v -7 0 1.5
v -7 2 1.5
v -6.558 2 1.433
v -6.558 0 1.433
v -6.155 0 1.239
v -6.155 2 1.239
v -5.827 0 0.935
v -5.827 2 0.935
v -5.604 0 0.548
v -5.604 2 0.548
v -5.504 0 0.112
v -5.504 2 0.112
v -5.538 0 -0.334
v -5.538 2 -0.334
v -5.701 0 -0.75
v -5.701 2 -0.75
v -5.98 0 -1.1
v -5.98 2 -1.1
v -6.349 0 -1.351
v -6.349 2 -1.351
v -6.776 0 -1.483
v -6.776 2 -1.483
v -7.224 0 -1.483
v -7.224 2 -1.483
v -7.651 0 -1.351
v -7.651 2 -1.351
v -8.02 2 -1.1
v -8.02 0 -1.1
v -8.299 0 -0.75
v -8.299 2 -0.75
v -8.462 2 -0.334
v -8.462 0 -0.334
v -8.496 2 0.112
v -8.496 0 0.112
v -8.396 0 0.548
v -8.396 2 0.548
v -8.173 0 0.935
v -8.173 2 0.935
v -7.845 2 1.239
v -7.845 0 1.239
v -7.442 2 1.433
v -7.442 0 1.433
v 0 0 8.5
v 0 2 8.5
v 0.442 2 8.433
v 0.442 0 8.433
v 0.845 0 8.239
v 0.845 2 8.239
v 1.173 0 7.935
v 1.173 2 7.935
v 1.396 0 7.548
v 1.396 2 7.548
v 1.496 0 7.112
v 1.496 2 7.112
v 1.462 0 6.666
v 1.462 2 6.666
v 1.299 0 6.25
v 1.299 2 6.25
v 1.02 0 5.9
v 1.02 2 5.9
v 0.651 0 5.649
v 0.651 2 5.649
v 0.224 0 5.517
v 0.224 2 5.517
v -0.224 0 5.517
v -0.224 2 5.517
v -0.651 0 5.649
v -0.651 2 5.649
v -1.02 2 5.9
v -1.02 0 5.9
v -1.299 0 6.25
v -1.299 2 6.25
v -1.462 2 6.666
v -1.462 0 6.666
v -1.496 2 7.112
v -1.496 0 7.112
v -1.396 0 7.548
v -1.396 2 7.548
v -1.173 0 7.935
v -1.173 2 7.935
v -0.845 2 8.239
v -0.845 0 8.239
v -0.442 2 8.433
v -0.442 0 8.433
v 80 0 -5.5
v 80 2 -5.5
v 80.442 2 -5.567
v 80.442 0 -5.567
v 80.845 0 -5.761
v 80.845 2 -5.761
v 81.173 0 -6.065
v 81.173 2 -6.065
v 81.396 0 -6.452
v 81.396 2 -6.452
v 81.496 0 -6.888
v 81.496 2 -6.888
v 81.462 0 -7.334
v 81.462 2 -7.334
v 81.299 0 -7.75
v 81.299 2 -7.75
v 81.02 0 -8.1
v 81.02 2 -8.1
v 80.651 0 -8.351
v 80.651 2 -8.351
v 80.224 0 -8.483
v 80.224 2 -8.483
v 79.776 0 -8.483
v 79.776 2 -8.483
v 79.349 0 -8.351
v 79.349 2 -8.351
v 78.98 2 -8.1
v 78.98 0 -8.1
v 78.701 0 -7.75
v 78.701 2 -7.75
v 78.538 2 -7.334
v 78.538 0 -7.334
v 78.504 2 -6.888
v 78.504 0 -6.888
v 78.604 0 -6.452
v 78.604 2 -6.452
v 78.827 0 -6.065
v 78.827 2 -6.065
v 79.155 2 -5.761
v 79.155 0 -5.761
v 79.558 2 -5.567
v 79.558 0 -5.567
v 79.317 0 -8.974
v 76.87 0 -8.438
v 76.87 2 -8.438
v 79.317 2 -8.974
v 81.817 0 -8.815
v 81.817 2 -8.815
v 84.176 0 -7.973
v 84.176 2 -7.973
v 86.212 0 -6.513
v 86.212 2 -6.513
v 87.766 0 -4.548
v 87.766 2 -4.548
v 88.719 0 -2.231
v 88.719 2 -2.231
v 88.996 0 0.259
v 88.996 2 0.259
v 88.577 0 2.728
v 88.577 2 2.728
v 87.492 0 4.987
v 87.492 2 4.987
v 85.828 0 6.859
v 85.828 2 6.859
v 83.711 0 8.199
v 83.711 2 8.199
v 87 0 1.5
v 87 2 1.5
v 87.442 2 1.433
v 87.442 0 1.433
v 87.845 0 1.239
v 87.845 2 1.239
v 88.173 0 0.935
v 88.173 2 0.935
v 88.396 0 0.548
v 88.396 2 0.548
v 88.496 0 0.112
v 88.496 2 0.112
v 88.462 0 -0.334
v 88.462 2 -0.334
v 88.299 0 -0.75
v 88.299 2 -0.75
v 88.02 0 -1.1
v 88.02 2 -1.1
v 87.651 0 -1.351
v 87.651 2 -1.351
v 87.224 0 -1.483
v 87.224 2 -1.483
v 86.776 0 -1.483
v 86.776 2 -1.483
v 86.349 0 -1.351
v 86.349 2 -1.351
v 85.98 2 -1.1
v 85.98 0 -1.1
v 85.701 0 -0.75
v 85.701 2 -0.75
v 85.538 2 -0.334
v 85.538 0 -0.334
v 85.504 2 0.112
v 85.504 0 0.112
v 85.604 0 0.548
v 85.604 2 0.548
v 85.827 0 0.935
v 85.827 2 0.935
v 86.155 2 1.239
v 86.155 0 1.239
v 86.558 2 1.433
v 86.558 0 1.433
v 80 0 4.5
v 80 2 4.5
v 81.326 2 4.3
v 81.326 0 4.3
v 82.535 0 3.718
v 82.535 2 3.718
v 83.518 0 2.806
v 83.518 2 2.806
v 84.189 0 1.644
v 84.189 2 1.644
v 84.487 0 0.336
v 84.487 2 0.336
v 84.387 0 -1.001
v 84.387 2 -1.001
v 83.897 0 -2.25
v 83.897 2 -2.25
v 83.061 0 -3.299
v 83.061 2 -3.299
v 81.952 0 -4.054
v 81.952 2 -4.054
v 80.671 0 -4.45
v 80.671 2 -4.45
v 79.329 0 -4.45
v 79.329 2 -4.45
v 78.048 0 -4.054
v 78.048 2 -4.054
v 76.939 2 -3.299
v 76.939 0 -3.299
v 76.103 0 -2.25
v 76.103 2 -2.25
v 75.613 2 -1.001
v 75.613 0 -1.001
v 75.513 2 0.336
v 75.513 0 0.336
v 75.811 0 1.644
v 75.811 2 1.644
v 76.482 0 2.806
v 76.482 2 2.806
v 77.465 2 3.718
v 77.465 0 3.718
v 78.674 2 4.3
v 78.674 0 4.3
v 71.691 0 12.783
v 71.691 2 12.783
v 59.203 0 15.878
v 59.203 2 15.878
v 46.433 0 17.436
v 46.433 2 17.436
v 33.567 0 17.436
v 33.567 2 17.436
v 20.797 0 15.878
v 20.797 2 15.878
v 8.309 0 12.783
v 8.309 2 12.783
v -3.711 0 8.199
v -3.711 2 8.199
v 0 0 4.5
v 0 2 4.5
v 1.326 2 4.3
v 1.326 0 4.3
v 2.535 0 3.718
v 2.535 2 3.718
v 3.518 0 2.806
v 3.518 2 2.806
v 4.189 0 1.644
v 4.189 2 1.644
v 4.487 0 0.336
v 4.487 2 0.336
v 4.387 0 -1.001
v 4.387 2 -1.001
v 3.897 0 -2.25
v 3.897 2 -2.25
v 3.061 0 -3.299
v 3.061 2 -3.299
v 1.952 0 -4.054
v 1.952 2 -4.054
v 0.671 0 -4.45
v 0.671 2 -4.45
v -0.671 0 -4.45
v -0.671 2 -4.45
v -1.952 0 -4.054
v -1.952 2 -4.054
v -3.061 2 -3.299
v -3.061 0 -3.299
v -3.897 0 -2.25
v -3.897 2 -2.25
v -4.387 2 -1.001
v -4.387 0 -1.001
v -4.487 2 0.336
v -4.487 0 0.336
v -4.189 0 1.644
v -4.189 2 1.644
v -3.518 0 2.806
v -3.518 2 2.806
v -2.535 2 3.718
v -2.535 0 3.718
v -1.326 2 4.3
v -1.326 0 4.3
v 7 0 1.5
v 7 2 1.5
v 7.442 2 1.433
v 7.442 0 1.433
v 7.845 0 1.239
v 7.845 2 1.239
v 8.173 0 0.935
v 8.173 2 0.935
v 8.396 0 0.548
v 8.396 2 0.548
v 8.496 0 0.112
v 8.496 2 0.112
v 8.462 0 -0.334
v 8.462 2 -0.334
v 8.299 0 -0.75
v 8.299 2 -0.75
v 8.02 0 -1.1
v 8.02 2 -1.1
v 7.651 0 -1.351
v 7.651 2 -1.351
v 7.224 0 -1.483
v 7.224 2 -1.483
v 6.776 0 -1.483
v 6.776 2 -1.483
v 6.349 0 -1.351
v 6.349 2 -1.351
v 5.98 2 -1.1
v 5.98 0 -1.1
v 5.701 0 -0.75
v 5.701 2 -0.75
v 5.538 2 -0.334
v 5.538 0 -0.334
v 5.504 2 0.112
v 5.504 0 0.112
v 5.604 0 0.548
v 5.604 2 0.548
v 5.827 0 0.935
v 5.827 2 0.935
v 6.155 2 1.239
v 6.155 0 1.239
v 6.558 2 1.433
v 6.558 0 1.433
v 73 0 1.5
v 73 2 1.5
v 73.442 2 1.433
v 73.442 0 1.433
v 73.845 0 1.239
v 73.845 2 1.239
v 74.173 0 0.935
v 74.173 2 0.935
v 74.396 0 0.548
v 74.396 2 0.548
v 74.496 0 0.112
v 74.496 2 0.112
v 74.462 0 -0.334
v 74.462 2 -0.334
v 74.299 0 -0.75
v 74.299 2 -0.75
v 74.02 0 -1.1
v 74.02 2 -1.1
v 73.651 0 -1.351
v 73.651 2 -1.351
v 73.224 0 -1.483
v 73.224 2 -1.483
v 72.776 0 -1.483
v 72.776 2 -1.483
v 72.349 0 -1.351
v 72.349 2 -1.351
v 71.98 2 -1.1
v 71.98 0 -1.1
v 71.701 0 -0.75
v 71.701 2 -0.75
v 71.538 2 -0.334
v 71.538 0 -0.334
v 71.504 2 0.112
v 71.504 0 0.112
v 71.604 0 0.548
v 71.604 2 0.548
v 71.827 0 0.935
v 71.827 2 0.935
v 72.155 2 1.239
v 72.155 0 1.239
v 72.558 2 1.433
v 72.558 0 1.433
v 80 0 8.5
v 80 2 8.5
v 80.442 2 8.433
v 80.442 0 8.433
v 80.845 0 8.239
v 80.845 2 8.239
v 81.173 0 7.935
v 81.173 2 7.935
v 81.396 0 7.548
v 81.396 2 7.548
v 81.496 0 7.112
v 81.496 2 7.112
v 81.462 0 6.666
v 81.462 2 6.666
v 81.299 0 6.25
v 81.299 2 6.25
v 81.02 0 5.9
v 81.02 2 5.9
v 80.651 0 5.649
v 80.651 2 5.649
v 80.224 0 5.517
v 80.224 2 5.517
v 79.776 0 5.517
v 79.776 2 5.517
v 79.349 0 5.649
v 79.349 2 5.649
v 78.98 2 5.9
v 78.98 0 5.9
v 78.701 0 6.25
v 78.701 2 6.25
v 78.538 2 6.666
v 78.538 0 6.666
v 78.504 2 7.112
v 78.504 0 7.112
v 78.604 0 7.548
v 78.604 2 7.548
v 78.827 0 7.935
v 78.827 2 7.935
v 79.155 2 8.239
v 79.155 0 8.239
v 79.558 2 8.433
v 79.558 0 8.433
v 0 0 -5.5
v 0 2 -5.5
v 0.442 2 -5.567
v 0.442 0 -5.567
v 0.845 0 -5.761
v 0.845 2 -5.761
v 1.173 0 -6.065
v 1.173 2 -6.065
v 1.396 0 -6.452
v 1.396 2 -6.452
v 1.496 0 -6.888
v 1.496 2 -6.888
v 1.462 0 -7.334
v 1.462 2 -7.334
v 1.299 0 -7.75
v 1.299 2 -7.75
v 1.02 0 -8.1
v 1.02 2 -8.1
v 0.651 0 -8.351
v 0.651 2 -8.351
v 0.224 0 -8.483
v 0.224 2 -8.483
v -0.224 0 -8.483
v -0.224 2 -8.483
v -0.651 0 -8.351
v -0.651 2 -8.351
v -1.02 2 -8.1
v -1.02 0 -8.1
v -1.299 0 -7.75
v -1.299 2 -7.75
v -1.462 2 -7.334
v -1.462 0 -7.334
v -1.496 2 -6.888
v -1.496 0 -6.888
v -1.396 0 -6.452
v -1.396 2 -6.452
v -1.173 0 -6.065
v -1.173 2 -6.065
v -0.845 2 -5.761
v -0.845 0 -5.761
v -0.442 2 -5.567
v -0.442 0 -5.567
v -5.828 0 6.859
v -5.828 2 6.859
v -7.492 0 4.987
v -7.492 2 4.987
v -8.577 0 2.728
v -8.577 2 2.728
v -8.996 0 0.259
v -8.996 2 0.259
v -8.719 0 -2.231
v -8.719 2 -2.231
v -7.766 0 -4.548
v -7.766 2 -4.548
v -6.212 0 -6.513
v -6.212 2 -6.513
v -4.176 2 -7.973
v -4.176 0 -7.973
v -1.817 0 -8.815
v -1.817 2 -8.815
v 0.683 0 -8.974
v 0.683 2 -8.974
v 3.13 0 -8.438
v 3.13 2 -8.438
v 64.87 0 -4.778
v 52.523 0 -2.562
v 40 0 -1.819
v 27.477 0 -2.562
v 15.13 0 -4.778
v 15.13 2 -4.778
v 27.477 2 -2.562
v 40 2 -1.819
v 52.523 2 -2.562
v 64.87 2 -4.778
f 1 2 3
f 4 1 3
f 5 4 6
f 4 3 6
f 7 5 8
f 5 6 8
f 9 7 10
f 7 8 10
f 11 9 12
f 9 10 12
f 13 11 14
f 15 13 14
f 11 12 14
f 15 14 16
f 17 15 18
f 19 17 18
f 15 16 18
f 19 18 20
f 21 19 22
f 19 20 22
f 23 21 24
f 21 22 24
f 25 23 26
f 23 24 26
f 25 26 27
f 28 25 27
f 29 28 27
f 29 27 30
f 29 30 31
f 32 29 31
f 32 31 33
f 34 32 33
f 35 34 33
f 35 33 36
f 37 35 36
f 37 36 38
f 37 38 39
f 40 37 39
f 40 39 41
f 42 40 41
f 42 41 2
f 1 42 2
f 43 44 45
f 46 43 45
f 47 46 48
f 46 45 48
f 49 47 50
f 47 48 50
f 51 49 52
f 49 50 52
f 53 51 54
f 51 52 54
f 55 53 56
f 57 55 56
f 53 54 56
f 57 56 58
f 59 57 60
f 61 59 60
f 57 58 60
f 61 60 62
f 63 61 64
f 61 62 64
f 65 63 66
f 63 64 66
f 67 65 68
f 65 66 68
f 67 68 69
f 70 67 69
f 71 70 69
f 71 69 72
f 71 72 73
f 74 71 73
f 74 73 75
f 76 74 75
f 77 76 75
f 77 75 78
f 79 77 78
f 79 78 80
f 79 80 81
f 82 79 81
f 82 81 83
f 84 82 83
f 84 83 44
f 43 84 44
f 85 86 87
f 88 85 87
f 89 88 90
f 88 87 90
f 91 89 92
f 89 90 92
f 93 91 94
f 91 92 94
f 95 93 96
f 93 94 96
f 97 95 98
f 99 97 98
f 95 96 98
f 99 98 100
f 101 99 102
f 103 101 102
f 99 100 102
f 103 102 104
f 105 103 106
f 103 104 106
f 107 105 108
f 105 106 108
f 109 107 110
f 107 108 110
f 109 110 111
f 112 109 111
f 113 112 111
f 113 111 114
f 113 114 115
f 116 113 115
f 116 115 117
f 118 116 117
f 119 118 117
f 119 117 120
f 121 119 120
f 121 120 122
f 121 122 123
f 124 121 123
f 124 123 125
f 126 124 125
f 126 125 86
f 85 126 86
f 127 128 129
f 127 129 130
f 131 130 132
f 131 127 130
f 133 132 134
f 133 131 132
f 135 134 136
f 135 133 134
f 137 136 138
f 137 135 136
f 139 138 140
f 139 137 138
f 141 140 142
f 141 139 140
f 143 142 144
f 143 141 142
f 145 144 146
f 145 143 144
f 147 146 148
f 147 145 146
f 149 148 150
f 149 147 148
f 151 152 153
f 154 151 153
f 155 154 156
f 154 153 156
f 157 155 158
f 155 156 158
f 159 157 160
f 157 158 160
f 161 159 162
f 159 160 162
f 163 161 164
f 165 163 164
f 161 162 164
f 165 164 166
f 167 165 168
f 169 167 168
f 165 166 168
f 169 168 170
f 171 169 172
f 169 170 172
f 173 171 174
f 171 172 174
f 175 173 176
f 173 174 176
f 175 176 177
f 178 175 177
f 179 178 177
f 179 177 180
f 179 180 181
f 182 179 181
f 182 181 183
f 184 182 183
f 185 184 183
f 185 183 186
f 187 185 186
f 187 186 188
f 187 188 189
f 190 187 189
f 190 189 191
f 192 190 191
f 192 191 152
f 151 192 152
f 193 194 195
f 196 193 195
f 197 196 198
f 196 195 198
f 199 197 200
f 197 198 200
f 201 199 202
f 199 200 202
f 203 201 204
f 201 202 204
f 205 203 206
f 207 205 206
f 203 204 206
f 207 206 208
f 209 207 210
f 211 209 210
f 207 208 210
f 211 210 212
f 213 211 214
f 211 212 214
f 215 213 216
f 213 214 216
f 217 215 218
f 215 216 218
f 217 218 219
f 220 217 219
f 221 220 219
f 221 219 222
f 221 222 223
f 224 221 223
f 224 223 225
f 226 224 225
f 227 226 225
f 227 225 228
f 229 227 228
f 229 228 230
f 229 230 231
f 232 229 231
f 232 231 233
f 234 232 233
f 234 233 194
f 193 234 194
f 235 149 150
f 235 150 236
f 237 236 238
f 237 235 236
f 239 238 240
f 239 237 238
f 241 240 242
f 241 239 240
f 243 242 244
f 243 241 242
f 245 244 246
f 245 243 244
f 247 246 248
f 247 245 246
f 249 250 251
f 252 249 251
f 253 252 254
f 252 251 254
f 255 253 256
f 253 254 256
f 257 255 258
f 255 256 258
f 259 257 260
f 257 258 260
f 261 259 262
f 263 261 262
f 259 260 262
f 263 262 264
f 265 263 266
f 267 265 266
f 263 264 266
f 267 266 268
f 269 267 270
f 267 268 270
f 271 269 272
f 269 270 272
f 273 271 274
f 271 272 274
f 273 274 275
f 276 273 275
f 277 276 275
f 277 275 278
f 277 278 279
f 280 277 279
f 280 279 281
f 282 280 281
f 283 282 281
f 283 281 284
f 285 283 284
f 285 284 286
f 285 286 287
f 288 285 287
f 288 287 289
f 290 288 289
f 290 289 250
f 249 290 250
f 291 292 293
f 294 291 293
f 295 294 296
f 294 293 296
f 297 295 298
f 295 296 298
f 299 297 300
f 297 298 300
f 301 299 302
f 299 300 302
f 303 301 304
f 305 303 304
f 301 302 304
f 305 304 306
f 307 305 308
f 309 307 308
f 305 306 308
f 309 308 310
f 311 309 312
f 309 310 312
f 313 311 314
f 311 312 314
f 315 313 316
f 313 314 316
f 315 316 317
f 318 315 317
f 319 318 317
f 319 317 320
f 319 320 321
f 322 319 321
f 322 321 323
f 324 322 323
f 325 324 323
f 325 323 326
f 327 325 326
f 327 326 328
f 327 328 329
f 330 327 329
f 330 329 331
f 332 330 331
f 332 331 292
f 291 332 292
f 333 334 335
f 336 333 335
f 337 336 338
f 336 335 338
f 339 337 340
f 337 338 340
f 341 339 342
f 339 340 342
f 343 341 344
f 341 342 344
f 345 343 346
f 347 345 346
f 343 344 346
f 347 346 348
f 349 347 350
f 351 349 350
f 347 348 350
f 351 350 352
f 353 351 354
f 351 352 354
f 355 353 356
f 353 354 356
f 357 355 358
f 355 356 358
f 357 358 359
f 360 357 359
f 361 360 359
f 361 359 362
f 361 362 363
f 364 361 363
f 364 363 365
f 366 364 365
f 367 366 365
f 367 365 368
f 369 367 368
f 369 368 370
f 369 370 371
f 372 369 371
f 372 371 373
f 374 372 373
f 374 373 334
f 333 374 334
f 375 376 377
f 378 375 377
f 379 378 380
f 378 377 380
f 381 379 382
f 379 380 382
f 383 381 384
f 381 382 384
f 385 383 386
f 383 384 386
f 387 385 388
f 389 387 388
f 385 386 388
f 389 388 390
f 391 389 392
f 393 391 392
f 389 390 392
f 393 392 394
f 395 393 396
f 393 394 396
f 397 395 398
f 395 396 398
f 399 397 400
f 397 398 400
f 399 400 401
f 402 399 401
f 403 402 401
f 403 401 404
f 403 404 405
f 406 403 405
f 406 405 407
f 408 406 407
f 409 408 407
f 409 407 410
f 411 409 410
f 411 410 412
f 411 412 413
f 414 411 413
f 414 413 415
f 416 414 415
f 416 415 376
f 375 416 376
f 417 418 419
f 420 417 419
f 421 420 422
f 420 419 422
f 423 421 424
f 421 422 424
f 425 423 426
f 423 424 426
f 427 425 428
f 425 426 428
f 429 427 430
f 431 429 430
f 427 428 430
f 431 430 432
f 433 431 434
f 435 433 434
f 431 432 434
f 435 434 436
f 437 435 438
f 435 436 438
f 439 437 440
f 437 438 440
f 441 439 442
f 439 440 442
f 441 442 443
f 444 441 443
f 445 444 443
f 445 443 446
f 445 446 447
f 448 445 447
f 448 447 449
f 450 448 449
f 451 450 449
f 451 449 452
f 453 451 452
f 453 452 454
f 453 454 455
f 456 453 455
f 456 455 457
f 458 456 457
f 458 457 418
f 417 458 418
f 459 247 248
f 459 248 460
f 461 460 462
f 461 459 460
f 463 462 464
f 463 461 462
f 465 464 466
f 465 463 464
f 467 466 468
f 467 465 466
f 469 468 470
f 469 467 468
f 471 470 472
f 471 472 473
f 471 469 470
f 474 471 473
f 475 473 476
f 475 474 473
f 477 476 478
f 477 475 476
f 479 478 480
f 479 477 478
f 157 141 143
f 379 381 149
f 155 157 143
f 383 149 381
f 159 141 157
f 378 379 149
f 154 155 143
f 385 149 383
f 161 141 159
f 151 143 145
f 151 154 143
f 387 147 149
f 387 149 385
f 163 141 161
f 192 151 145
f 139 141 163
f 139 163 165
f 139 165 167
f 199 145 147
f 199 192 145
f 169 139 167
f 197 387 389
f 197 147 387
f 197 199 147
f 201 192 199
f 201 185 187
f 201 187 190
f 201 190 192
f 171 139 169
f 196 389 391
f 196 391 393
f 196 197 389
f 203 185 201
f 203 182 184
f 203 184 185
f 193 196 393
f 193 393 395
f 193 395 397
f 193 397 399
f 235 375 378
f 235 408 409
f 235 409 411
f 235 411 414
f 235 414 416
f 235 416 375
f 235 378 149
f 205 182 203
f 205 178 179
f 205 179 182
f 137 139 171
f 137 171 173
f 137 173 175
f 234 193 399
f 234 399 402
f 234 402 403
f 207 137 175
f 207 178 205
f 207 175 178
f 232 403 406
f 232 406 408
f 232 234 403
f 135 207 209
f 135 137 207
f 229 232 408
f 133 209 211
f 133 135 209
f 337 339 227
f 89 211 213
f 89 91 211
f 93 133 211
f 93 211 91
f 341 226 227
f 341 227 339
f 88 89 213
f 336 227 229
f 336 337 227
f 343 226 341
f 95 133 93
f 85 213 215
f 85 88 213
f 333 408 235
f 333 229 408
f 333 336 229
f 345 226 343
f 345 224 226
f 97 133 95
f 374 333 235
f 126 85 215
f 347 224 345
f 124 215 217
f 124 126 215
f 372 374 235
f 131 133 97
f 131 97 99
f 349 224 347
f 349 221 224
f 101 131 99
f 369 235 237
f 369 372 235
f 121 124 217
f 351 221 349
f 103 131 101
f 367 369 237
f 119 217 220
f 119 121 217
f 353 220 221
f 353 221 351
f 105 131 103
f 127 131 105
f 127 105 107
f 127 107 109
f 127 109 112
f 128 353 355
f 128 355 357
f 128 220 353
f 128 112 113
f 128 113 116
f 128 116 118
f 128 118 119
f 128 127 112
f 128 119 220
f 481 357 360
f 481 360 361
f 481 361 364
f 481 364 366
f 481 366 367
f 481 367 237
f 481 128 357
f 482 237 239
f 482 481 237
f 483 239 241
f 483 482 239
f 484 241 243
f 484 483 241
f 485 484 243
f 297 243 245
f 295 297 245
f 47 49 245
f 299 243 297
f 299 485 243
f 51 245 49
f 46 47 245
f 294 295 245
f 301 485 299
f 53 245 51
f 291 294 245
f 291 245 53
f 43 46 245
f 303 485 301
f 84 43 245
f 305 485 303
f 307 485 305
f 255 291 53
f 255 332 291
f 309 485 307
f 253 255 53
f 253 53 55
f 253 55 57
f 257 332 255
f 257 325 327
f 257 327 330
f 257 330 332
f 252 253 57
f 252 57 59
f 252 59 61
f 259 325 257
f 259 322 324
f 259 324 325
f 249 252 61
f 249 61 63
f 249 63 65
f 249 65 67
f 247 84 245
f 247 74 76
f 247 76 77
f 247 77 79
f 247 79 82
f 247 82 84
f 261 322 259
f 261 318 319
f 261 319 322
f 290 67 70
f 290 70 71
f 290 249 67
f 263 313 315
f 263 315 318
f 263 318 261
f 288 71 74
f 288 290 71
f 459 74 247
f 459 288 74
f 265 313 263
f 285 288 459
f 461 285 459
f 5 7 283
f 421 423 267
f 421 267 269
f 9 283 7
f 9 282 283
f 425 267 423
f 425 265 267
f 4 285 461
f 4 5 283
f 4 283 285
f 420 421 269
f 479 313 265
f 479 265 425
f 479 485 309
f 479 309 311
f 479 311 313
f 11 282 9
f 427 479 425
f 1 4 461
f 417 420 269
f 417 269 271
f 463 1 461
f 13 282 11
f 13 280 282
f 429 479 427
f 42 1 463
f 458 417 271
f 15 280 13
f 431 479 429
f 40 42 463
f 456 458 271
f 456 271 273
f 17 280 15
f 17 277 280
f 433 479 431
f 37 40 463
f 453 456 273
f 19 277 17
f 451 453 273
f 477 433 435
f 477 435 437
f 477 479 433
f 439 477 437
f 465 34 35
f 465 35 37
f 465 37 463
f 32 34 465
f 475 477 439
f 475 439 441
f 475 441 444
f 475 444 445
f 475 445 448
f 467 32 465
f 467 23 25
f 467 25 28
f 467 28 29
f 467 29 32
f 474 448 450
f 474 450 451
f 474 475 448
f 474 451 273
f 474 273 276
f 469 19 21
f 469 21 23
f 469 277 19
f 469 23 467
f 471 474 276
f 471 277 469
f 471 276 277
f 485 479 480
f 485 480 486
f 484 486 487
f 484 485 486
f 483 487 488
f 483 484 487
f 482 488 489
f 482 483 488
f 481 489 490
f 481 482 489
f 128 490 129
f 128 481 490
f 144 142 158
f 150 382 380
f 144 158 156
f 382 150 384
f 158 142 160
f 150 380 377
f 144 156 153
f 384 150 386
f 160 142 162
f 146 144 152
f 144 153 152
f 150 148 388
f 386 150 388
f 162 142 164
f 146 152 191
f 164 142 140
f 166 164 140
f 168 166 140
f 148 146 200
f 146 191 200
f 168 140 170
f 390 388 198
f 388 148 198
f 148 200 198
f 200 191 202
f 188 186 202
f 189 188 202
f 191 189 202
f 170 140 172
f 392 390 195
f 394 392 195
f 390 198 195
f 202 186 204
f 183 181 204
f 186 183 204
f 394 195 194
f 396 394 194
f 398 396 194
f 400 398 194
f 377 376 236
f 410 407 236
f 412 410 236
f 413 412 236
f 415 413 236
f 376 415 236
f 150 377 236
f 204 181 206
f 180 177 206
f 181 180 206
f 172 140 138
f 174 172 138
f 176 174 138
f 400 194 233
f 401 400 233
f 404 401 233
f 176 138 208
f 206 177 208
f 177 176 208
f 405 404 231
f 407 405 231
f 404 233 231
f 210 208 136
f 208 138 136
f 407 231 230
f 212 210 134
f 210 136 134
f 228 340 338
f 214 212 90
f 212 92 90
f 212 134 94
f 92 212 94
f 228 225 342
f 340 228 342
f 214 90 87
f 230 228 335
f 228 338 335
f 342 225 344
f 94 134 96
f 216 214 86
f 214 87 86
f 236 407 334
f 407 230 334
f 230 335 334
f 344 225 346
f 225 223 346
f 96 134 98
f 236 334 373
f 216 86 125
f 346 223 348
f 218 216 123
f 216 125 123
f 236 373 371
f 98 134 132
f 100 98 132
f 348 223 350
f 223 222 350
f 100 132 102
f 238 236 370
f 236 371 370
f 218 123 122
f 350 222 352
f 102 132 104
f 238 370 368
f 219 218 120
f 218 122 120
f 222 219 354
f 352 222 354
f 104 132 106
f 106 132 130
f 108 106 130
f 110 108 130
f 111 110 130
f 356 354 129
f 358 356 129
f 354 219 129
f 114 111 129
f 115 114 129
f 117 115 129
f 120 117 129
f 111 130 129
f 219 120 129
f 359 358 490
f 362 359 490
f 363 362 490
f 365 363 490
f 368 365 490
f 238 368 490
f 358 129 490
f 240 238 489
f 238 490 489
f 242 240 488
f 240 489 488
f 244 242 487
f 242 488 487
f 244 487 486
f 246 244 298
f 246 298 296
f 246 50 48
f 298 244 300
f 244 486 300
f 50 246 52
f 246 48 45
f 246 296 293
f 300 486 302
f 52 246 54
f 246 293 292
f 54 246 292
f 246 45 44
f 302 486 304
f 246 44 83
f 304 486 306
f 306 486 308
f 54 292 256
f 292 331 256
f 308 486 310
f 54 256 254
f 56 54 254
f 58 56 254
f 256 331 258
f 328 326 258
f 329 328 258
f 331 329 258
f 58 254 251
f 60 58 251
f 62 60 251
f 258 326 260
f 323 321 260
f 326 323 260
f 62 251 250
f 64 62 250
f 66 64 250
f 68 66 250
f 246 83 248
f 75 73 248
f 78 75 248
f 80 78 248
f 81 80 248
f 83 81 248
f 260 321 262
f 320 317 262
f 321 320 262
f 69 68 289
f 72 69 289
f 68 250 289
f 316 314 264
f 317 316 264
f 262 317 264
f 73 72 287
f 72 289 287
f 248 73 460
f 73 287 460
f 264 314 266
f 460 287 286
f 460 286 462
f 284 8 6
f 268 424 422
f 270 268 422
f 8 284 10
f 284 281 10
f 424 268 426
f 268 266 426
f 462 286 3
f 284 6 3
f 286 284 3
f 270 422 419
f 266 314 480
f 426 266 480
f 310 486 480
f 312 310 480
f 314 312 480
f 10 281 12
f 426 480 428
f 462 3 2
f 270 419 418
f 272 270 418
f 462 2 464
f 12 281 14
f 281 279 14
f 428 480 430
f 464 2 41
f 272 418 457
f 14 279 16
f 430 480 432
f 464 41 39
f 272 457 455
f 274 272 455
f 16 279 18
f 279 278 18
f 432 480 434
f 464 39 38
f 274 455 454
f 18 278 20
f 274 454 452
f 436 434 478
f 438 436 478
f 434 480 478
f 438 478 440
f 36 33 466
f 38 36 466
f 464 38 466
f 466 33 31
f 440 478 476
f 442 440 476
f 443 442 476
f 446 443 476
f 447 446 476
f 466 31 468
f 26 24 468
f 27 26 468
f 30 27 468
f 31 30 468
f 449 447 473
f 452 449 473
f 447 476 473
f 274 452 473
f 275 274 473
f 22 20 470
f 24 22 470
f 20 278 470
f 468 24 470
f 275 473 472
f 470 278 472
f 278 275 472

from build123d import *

# Parameters (mm, degrees)
EXTRUDE_1_DEPTH     = 2
SKETCH_2_R          = 4.5
SKETCH_2_R_2        = 1.5
CUT_EXTRUDE_1_DEPTH = 91.751684032


with BuildPart() as part:
    # 草图1 → 凸台-拉伸1 (new body)
    with BuildSketch(Plane(origin=(0, 0, 0), x_dir=(1, 0, 0), z_dir=(0, 1, 0))):
        with BuildLine():
            ThreePointArc((3.130434783, 8.438031647), (40, 1.819293264), (76.869565217, 8.438031647))
            ThreePointArc((76.869565217, 8.438031647), (88.32365676, 3.422972121), (83.711340206, -8.199143484))
            ThreePointArc((83.711340206, -8.199143484), (40, -17.63145356), (-3.711340206, -8.199143484))
            ThreePointArc((-3.711340206, -8.199143484), (-8.32365676, 3.422972121), (3.130434783, 8.438031647))
        make_face()
    extrude(amount=EXTRUDE_1_DEPTH)

    # 草图2 → 切除-拉伸1 (cut, through all)
    with BuildSketch(Plane(origin=(0, 2, 0), x_dir=(1, 0, 0), z_dir=(0, 1, 0))):
        with Locations(Location((0, 0, 0), (0, 0, 270))):
            Circle(SKETCH_2_R)
        with Locations(Location((80, 0, 0), (0, 0, 270))):
            Circle(SKETCH_2_R)
        with Locations(Location((7, 0, 0), (0, 0, 270))):
            Circle(SKETCH_2_R_2)
        with Locations(Location((0, -7, 0), (0, 0, 270))):
            Circle(SKETCH_2_R_2)
        with Locations(Location((-7, 0, 0), (0, 0, 270))):
            Circle(SKETCH_2_R_2)
        with Locations(Location((0, 7, 0), (0, 0, 270))):
            Circle(SKETCH_2_R_2)
        with Locations(Location((73, 0, 0), (0, 0, 270))):
            Circle(SKETCH_2_R_2)
        with Locations(Location((80, 7, 0), (0, 0, 270))):
            Circle(SKETCH_2_R_2)
        with Locations(Location((87, 0, 0), (0, 0, 270))):
            Circle(SKETCH_2_R_2)
        with Locations(Location((80, -7, 0), (0, 0, 270))):
            Circle(SKETCH_2_R_2)
    extrude(amount=-CUT_EXTRUDE_1_DEPTH, mode=Mode.SUBTRACT)


solid = part.part
